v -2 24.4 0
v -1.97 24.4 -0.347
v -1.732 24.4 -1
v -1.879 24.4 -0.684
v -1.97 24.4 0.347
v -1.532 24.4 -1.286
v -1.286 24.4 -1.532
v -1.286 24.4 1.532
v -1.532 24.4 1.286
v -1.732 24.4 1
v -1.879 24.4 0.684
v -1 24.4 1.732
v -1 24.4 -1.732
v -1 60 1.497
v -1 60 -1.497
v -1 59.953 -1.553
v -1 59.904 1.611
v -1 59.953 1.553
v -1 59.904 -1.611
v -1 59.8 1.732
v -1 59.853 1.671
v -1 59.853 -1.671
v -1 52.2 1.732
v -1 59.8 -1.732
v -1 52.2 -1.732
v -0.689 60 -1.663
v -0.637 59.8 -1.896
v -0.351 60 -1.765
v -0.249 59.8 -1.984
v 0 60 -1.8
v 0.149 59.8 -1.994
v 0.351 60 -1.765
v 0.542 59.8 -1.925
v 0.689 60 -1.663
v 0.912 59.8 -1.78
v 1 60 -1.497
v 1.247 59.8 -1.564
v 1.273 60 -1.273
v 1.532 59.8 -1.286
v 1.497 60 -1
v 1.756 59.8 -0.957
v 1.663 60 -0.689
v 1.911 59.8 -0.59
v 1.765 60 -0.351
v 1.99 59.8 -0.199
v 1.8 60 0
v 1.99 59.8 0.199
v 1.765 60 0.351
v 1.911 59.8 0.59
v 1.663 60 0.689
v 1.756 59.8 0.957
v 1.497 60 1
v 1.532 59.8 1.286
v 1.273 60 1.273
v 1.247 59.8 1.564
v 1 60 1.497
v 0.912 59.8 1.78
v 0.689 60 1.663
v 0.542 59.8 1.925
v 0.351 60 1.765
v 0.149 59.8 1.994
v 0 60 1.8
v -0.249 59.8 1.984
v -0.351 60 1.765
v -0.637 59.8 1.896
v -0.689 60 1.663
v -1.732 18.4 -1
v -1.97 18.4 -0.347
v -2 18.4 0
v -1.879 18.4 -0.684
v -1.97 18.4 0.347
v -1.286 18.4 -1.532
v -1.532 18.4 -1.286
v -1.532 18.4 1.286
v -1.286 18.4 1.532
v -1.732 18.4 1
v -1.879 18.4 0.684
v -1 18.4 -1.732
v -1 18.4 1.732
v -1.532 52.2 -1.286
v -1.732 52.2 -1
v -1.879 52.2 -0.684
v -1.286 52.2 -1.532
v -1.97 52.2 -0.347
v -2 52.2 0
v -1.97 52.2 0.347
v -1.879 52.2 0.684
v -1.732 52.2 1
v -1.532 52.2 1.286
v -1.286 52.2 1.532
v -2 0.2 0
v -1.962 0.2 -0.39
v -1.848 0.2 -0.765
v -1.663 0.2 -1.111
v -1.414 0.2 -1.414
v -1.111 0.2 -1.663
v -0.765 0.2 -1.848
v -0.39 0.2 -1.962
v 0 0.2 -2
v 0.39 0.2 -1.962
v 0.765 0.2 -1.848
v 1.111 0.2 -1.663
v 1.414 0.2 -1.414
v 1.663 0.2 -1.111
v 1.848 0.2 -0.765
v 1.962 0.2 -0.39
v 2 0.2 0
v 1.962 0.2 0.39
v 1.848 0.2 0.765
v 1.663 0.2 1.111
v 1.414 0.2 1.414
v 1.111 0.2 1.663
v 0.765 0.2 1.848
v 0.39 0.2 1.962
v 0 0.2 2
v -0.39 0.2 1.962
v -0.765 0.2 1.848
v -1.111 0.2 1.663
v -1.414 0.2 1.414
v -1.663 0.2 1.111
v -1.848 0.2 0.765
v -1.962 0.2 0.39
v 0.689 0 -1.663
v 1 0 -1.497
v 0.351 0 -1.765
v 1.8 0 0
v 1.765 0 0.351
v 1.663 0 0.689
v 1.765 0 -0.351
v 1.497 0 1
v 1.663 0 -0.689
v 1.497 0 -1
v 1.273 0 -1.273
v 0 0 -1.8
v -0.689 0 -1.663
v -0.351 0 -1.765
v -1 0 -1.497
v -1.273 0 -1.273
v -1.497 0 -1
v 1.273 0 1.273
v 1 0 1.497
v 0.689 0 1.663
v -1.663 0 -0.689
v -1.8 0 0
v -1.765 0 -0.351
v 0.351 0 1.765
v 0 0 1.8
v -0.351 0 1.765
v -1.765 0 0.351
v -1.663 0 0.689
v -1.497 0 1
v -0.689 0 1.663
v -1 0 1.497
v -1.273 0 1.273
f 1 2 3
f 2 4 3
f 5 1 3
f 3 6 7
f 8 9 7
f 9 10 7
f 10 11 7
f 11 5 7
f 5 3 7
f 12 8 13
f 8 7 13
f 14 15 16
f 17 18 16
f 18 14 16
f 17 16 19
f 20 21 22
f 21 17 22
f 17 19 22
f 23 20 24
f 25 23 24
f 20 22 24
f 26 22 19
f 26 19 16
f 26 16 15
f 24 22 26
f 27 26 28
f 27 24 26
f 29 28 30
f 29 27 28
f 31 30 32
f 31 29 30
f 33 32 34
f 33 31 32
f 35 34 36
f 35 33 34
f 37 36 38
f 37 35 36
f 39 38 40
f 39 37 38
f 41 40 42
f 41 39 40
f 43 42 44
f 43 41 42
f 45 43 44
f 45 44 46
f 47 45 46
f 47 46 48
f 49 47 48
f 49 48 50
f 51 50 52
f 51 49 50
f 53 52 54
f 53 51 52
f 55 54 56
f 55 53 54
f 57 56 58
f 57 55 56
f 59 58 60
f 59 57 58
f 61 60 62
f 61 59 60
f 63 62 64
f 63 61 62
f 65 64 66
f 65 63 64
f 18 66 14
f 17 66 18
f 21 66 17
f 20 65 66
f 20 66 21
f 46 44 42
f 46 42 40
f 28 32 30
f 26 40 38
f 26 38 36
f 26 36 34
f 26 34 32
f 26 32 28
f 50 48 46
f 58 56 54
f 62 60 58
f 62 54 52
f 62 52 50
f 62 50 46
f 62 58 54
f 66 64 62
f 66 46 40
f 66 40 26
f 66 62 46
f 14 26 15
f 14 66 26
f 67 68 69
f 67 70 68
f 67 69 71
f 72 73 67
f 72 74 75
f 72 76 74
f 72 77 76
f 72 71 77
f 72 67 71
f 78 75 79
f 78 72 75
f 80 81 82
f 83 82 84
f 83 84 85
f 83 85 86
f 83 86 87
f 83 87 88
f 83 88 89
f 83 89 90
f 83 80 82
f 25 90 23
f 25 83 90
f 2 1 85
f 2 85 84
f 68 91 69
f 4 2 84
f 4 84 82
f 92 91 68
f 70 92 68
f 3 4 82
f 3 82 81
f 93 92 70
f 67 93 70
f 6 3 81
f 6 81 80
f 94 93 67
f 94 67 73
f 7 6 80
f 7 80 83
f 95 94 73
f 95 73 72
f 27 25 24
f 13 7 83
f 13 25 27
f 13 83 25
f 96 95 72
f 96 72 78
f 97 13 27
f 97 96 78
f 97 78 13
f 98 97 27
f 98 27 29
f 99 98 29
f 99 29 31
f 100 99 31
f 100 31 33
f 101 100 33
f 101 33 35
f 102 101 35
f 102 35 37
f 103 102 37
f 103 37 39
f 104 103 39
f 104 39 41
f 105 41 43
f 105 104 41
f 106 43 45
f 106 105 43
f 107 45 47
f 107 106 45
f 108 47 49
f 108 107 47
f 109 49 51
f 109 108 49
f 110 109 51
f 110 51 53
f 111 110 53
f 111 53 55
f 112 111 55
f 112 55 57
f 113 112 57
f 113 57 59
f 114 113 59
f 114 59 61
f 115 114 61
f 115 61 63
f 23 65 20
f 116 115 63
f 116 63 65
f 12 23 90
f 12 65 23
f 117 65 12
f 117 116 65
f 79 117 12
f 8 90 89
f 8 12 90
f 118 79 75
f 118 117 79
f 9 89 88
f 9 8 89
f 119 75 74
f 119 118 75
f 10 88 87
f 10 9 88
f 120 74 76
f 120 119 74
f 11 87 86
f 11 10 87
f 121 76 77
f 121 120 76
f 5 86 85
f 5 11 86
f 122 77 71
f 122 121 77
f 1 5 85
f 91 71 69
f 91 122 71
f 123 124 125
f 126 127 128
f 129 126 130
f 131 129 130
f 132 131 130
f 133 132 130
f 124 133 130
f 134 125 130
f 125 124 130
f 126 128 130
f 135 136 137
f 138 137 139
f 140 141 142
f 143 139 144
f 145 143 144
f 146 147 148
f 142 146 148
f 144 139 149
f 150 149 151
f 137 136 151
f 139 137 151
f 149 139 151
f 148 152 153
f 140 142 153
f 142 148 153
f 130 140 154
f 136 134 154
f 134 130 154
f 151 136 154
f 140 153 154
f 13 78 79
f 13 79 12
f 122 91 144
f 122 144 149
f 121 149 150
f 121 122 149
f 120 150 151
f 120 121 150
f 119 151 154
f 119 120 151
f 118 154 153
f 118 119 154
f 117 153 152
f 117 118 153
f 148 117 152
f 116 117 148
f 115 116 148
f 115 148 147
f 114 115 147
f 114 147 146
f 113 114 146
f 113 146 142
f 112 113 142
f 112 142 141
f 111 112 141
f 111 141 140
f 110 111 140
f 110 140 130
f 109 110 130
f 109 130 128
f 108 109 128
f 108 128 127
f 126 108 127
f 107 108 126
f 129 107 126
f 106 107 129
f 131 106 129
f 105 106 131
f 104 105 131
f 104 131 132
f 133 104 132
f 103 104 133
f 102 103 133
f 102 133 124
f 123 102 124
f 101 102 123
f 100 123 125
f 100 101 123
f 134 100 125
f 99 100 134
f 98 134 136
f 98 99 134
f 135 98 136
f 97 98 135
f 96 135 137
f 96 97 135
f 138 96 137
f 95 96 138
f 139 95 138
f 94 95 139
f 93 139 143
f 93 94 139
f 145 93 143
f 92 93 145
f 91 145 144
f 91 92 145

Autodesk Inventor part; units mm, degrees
ref_plane "YZ Plane" through (0, 0, 0) normal (1, 0, 0) x (0, 1, 0)
ref_plane "XZ Plane" through (0, 0, 0) normal (0, 1, 0) x (-1, 0, 0)
sketch "スケッチ1" plane through (0, 0, 0) normal (0, 1, 0) x (-1, 0, 0)
  circle A0 centre (0, 0) radius 2
  dimension "d0" = 4
extrude "押し出し1" add sketch "スケッチ1" along normal blind 60
sketch "スケッチ2" plane through (0, 60, 0) normal (0, 1, 0) x (1, 0, 0)
  circle A0 centre (0, 0) radius 2 projected
  line L0 (-1, -1.7321) -> (-1, 1.7321)
  dimension "d3" = 1
extrude "押し出し2" cut sketch "スケッチ2" against normal blind 7.8 contours L0 A0 picked at (-1.1242, -0.4849)
chamfer "面取り1" distance 0.2 angle 45 2 edges at (2, 60, 0) (2, 0, 0)
sketch "スケッチ3" plane through (0, 0, 0) normal (0, 0, 1) x (1, 0, 0)
  line L0 (-2, 18.4) -> (-1, 18.4)
  line L1 (-1, 18.4) -> (-1, 21.4)
  line L2 (-1, 21.4) -> (-2, 21.4)
  line L3 (-2, 21.4) -> (-2, 18.4)
  line L4 (1.8, 0) -> (-1.8, 0) projected
  line L5 (-2, 24.4) -> (-1, 24.4)
  line L6 (-1, 24.4) -> (-1, 21.4)
  line L7 (-2, 21.4) -> (-2, 24.4)
  line L8 (-2, 0.2) -> (-2, 52.2) projected
  point P0 (0, 0)
  dimension "d9" = 1
  dimension "d10" = 3
  dimension "d11" = 21.4
extrude "押し出し3" cut sketch "スケッチ3" along normal mid plane 55
ref_plane "作業平面1" through (0, 21.4, 0) normal (0, 1, 0) x (-1, 0, 0)
sketch "スケッチ5" plane through (0, 21.4, 0) normal (0, 1, 0) x (-1, 0, 0)
  line L0 (0, 0) -> (7.6217, 0)
properties part number "shaft" material "アルミニウム 6061"
